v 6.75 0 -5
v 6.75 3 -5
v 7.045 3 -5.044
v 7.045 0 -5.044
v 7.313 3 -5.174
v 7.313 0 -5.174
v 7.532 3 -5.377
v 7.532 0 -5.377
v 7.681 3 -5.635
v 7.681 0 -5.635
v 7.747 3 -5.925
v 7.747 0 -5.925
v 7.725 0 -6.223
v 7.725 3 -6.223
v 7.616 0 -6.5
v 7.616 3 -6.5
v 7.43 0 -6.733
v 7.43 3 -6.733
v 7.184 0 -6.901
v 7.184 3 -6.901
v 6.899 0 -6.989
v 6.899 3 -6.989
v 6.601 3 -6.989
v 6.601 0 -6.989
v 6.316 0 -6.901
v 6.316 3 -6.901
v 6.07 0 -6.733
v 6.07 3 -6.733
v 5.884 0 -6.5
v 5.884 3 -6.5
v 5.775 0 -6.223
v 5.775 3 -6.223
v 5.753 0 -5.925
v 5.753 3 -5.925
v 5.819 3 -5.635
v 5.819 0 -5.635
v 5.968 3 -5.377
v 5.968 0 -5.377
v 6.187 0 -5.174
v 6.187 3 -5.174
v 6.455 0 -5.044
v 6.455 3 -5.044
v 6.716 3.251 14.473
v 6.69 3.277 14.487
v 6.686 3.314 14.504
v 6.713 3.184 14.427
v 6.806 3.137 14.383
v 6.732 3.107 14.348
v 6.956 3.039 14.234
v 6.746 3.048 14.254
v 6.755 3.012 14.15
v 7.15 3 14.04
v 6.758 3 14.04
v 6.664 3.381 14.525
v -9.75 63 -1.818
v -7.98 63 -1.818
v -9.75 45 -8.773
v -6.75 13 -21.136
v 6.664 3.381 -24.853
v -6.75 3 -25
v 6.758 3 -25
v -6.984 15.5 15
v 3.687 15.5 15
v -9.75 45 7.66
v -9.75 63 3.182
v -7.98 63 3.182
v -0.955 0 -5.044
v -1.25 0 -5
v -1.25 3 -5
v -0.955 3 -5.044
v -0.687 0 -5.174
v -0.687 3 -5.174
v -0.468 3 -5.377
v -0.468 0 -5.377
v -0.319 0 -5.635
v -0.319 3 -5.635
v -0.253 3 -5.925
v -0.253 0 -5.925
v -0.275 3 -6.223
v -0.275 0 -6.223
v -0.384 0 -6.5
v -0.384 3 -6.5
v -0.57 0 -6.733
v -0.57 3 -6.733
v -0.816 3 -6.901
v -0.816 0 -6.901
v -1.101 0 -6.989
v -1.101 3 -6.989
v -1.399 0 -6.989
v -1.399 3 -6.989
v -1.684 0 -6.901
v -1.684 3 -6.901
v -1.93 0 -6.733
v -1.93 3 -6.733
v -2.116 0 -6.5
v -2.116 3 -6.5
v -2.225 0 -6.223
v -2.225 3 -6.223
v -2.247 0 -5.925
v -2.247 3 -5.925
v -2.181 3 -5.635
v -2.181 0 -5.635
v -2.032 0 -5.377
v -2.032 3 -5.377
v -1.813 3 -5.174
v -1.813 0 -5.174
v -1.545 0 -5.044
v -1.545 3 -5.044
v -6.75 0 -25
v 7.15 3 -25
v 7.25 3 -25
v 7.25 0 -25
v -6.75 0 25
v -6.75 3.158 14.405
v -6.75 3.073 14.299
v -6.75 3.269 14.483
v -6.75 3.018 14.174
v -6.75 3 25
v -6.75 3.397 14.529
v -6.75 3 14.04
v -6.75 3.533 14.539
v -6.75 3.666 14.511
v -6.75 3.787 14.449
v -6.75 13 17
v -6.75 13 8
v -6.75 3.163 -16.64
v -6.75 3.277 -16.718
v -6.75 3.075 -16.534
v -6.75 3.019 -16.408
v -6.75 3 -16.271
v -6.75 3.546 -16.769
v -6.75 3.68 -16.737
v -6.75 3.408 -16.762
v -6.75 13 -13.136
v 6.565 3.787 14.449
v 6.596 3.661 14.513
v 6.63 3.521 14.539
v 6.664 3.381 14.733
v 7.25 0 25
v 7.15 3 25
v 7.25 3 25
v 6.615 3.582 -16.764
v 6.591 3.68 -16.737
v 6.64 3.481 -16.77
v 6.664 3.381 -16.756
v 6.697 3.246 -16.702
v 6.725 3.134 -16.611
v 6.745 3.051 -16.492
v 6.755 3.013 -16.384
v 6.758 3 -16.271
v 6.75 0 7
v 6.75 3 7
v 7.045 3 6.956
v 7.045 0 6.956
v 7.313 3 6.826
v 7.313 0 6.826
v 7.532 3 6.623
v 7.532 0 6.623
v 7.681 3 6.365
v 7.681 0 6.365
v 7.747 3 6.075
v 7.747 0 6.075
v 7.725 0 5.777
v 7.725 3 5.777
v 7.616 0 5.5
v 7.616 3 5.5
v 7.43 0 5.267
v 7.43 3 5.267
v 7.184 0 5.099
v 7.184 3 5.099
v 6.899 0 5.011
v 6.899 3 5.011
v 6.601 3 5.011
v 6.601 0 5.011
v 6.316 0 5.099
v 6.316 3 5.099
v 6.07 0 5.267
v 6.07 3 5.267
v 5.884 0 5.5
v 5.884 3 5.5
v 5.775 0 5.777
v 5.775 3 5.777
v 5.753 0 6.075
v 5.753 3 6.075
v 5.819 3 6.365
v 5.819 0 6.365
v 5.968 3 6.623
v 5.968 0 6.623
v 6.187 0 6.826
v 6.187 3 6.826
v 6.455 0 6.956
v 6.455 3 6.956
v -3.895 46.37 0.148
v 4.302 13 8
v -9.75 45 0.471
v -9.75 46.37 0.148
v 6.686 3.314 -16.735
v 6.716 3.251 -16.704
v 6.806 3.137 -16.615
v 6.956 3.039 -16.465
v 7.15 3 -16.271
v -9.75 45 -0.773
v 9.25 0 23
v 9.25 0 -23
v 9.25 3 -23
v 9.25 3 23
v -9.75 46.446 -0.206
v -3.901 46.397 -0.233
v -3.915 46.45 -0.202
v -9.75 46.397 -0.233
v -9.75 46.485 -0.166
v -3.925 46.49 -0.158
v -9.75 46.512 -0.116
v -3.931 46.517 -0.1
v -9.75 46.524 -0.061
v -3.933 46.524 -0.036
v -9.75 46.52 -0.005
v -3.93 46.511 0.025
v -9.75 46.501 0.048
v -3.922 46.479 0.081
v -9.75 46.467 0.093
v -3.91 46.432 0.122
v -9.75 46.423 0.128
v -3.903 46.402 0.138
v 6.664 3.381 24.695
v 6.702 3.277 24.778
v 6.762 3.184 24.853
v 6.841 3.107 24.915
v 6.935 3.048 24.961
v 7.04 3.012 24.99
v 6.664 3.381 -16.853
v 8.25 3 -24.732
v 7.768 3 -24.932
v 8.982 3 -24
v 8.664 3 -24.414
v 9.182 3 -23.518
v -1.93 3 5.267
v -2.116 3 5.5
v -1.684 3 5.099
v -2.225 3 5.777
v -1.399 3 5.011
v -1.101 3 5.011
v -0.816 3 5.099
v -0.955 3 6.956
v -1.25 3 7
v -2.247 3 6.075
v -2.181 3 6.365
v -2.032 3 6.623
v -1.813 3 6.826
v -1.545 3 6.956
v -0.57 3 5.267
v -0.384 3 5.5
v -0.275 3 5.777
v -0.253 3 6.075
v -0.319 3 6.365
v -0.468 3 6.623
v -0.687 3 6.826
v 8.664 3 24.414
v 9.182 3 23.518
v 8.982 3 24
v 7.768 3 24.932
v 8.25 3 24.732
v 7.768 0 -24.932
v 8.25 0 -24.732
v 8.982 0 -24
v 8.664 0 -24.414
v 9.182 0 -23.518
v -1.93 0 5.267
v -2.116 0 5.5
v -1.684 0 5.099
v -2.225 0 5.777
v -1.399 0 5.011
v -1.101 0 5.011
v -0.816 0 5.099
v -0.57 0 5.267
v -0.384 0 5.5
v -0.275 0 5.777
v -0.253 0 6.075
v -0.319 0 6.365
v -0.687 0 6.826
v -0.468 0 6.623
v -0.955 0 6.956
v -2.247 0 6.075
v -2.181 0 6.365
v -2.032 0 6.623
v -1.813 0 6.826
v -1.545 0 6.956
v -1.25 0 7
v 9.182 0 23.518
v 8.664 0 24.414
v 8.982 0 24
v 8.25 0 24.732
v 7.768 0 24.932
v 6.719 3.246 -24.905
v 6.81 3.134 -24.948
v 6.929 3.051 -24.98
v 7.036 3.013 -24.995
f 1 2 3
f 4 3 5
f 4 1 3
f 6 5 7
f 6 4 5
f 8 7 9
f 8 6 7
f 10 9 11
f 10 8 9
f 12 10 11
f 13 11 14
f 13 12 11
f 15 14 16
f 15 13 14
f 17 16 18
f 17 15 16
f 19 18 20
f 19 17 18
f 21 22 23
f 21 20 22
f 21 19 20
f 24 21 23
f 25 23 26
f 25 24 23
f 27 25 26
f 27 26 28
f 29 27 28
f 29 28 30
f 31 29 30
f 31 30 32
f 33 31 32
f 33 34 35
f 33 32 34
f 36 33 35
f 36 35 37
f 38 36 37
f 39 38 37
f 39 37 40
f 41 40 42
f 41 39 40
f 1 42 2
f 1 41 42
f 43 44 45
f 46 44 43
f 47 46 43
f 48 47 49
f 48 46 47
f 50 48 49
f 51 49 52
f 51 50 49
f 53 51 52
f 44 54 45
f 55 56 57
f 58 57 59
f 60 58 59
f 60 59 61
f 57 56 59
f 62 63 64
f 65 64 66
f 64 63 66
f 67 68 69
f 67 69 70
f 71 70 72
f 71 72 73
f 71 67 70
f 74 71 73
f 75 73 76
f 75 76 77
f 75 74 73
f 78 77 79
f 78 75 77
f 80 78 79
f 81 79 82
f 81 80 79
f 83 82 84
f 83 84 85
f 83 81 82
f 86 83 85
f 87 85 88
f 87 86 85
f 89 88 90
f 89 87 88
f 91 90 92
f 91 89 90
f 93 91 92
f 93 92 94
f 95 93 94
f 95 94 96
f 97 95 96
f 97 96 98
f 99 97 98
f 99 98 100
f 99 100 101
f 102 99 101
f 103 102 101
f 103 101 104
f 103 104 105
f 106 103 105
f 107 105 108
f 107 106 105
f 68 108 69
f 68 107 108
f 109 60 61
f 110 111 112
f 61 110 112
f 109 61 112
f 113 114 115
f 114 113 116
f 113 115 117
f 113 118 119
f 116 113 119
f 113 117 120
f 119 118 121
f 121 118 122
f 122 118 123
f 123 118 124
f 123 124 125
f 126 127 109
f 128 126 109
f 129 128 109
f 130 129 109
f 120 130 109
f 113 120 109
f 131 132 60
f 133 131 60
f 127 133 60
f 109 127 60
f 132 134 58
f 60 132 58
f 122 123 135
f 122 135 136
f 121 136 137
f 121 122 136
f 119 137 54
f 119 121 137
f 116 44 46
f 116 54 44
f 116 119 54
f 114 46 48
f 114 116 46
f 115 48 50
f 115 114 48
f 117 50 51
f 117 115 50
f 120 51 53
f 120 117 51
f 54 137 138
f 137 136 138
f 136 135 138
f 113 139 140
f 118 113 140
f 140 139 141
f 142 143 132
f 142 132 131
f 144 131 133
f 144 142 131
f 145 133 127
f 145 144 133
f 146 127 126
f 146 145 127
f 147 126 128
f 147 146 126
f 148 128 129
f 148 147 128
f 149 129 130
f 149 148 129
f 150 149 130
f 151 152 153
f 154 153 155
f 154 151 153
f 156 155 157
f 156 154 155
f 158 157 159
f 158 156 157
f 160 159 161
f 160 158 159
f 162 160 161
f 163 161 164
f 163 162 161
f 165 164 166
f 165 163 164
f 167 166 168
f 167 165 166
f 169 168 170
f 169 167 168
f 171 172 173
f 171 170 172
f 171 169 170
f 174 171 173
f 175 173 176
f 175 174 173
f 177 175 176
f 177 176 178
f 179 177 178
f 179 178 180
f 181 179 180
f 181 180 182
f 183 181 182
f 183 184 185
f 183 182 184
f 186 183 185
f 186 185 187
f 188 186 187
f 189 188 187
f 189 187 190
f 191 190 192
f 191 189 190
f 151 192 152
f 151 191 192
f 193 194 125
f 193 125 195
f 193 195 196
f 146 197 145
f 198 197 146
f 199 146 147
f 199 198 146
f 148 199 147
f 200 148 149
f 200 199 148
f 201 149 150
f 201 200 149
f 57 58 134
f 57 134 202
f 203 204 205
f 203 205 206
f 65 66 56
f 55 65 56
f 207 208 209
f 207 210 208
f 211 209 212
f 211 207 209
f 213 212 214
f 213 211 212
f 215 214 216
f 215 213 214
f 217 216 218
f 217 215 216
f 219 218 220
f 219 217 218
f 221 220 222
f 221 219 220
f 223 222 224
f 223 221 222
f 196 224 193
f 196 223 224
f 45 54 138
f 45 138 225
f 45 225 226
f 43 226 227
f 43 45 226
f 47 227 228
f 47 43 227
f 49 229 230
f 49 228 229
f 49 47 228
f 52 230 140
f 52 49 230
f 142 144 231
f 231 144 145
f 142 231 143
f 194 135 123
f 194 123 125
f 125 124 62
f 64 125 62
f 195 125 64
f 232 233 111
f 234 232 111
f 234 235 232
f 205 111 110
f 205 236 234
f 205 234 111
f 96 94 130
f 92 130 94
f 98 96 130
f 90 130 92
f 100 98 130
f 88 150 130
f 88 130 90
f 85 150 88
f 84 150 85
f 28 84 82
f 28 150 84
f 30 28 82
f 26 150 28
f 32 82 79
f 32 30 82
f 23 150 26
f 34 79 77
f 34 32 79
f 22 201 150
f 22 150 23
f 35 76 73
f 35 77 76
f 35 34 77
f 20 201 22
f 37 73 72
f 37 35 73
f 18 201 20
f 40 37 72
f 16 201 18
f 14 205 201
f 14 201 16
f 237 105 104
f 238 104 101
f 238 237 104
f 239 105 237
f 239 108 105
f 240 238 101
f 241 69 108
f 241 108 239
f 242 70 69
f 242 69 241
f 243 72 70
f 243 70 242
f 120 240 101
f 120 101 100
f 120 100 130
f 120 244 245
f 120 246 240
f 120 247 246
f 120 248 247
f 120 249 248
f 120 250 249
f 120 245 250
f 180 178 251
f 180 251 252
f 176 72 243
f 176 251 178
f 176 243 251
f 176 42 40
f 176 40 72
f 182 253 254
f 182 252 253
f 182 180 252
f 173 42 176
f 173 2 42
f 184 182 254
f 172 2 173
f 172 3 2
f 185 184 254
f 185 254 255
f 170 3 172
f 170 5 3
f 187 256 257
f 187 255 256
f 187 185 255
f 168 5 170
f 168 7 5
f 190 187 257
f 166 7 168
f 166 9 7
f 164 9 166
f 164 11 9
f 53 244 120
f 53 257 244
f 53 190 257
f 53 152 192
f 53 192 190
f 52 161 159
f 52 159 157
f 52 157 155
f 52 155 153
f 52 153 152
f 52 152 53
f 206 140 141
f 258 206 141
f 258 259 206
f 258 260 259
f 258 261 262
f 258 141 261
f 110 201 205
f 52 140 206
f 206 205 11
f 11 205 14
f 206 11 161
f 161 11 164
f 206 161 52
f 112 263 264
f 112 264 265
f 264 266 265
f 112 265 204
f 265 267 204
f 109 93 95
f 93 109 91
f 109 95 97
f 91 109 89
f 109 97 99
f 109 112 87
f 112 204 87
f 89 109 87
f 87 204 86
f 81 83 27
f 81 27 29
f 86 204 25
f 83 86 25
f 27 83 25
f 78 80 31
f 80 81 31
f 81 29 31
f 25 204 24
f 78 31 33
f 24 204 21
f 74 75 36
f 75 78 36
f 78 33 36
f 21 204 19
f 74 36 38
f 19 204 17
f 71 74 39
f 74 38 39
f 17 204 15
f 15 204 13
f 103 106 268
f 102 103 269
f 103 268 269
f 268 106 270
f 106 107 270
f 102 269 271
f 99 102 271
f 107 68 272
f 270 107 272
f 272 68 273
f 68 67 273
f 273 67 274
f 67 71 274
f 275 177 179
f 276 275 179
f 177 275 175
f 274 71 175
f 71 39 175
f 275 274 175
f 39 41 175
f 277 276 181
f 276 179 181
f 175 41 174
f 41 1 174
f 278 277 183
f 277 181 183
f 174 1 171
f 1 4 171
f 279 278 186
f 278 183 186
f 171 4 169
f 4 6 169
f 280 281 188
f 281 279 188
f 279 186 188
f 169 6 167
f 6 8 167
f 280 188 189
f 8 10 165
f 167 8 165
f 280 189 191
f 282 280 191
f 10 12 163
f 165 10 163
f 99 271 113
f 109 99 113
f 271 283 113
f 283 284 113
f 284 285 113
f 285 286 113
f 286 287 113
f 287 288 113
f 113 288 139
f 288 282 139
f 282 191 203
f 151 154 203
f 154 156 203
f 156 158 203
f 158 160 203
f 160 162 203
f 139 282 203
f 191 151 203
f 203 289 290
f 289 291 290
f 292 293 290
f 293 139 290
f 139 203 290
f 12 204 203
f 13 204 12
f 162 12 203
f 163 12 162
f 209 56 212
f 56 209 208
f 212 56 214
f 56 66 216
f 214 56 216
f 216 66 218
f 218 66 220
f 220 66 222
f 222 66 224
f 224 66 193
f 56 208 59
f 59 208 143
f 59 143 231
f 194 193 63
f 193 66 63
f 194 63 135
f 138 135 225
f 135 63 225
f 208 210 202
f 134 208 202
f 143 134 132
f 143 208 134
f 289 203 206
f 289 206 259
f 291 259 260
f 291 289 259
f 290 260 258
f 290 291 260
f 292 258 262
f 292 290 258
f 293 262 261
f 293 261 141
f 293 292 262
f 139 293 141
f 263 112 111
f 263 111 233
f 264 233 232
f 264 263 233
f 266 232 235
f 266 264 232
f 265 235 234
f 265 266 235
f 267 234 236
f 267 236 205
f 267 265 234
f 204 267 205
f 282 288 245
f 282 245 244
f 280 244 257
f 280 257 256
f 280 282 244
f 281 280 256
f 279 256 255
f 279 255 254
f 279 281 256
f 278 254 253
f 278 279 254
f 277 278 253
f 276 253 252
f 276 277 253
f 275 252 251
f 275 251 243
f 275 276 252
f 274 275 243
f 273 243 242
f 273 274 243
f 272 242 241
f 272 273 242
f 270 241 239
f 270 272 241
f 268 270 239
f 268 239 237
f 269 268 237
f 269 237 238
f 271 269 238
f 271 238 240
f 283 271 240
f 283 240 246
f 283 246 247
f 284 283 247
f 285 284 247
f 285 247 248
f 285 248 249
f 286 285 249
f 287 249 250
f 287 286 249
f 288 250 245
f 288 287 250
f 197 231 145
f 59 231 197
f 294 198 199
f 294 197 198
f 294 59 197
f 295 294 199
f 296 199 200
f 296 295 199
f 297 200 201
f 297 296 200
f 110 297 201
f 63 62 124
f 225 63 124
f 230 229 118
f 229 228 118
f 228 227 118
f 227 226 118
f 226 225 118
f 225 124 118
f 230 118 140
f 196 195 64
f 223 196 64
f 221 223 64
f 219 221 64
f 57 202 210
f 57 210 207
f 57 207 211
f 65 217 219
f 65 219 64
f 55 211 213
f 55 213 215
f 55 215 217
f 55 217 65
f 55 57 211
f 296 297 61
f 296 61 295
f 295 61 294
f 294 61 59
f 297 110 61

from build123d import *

# Parameters (mm, degrees)
SKETCH_1_R          = 1
EXTRUDE_1_DEPTH     = 3
SKETCH_2_W          = 16.007753667
SKETCH_2_H          = 50
EXTRUDE_2_DEPTH     = 80
CUT_EXTRUDE_1_DEPTH = 89.149011211
CUT_EXTRUDE_2_DEPTH = 81.960252593
EXTRUDE_3_DEPTH     = 3
CUT_EXTRUDE_3_DEPTH = 82.357621032
FILLET_1_R          = 0.5
FILLET_2_R          = 0.2


with BuildPart() as part:
    # 草图1 → 凸台-拉伸1 (new body)
    with BuildSketch(Plane(origin=(0, 0, 0), x_dir=(1, 0, 0), z_dir=(0, 1, 0))):
        with BuildLine():
            Line((-9.25, 25), (7.25, 25))
            ThreePointArc((7.25, 25), (8.664213562, 24.414213562), (9.25, 23))
            Line((9.25, 23), (9.25, -23))
            ThreePointArc((9.25, -23), (8.664213562, -24.414213562), (7.25, -25))
            Line((7.25, -25), (-9.25, -25))
            Line((-9.25, -25), (-9.25, 25))
        make_face()
        with Locations(Location((-1.25, 6, 0), (0, 0, 270))):
            Circle(SKETCH_1_R, mode=Mode.SUBTRACT)
        with Locations(Location((-1.25, -6, 0), (0, 0, 270))):
            Circle(SKETCH_1_R, mode=Mode.SUBTRACT)
        with Locations(Location((6.75, -6, 0), (0, 0, 270))):
            Circle(SKETCH_1_R, mode=Mode.SUBTRACT)
        with Locations(Location((6.75, 6, 0), (0, 0, 270))):
            Circle(SKETCH_1_R, mode=Mode.SUBTRACT)
    extrude(amount=EXTRUDE_1_DEPTH)

    # 草图2 → 凸台-拉伸2 (add)
    with BuildSketch(Plane(origin=(0, 3, 0), x_dir=(1, 0, 0), z_dir=(0, 1, 0))):
        with Locations((-1.246123166, 0)):
            Rectangle(SKETCH_2_W, SKETCH_2_H)
    extrude(amount=EXTRUDE_2_DEPTH)

    # 草图3 → 切除-拉伸1 (cut, through all)
    with BuildSketch(Plane(origin=(6.757753667, 0, 0), x_dir=(0, 0, -1), z_dir=(1, 0, 0))):
        Polygon((-25, 3), (-15, 15.5), (-3.181818182, 63), (1.818181818, 63), (25, 3), (32.784332669, 3), (32.784332669, 88.133626677), (-39.086773644, 88.133626677), (-39.086773644, 3), align=None)
        Polygon((-15, 3), (-8, 13), (0, 47), (17, 3), align=None)
    extrude(amount=-CUT_EXTRUDE_1_DEPTH, mode=Mode.SUBTRACT)

    # 草图4 → 切除-拉伸2 (cut, through all)
    with BuildSketch(Plane.XY.offset(25)):
        Polygon((6.757753667, 3), (6.757753667, 67.763295657), (-9.14963747, 67.763295657), align=None)
    extrude(amount=-CUT_EXTRUDE_2_DEPTH, mode=Mode.SUBTRACT)

    # 草图5 → 凸台-拉伸3 (add)
    with BuildSketch(Plane.ZY.offset(9.25)):
        Polygon((-1.818181818, 63), (-25, 3), (-25, 0), (25, 0), (25, 3), (15, 15.5), (3.181818182, 63), align=None)
        Polygon((0, 47), (-17, 3), (15, 3), (8, 13), align=None, mode=Mode.SUBTRACT)
    extrude(amount=EXTRUDE_3_DEPTH)

    # 草图6 → 切除-拉伸3 (cut, through all)
    with BuildSketch(Plane(origin=(0, 0, -25), x_dir=(-1, 0, 0), z_dir=(0, 0, -1))):
        Polygon((6.75, 0), (6.75, 13), (9.75, 45), (9.75, 64.870972757), (14.09361996, 64.870972757), (14.09361996, 0), align=None)
    extrude(amount=-CUT_EXTRUDE_3_DEPTH, mode=Mode.SUBTRACT)

    # 圆角1
    # the kernel refuses this fillet: 0.5 mm, written as the material it adds along each edge
    with BuildSketch(Plane(origin=(-6.75, 3, 15), x_dir=(0, 0, -1), z_dir=(1, 0, 0))) as fillet_1_piece_1_section:
        with BuildLine():
            CenterArc((FILLET_1_R * 1.92065556157, FILLET_1_R), FILLET_1_R, 145.007979801, 124.992020199)
            Line((FILLET_1_R * 1.10142364105, FILLET_1_R * 1.57346234436), (0, 0))
            Line((0, 0), (FILLET_1_R * 1.92065556157, 0))
        make_face()
    fillet_1_piece_1 = extrude(amount=15.908573119, mode=Mode.PRIVATE)
    fillet_1_piece_1 = split(fillet_1_piece_1, bisect_by=Plane(origin=(6.326718063, 4.754862629, 14.622728055), z_dir=(-0.9711342799096353, -0.23853345757858466, 0)), keep=Keep.TOP, mode=Mode.PRIVATE)
    add(fillet_1_piece_1)
    with BuildSketch(Plane(origin=(8.58076235, 3, -17), x_dir=(0, 0, 1), z_dir=(-1, 0, 0))) as fillet_1_piece_2_section:
        with BuildLine():
            CenterArc((FILLET_1_R * 1.45840694682, FILLET_1_R), FILLET_1_R, 158.875280854, 111.124719146)
            Line((FILLET_1_R * 0.525608812419, FILLET_1_R * 1.3603992792), (0, 0))
            Line((0, 0), (FILLET_1_R * 1.45840694682, 0))
        make_face()
    fillet_1_piece_2 = extrude(amount=15.33076235, mode=Mode.PRIVATE)
    fillet_1_piece_2 = split(fillet_1_piece_2, bisect_by=Plane(origin=(6.334852861, 4.721743663, -16.763347765), z_dir=(-0.9711342799096353, -0.23853345757858466, 0)), keep=Keep.TOP, mode=Mode.PRIVATE)
    add(fillet_1_piece_2)
    with BuildSketch(Plane(origin=(6.757753667, 3, 14.019874802), x_dir=(1, 0, 0), z_dir=(0, 0, 1))) as fillet_1_piece_3_section:
        with BuildLine():
            CenterArc((FILLET_1_R * 0.784100158108, FILLET_1_R), FILLET_1_R, 193.8, 76.2)
            Line((-FILLET_1_R * 0.187034121801, FILLET_1_R * 0.761466542421), (0, 0))
            Line((0, 0), (FILLET_1_R * 0.784100158108, 0))
        make_face()
    fillet_1_piece_3 = extrude(amount=10.980125198, mode=Mode.PRIVATE)
    fillet_1_piece_3 = split(fillet_1_piece_3, bisect_by=Plane(origin=(6.823819727, 0.737200979, 16.583959315), z_dir=(0, 0.5734623443633292, 0.8192319205190398)), keep=Keep.TOP, mode=Mode.PRIVATE)
    fillet_1_piece_3 = split(fillet_1_piece_3, bisect_by=Plane(origin=(6.823819727, 5.521194882, 22.983044095), z_dir=(0, -0.6246950475544246, -0.7808688094430302)), keep=Keep.TOP, mode=Mode.PRIVATE)
    add(fillet_1_piece_3)
    with BuildSketch(Plane(origin=(6.757753667, 3, -25), x_dir=(1, 0, 0), z_dir=(0, 0, 1))) as fillet_1_piece_4_section:
        with BuildLine():
            CenterArc((FILLET_1_R * 0.784100158108, FILLET_1_R), FILLET_1_R, 193.8, 76.2)
            Line((-FILLET_1_R * 0.187034121801, FILLET_1_R * 0.761466542421), (0, 0))
            Line((0, 0), (FILLET_1_R * 0.784100158108, 0))
        make_face()
    fillet_1_piece_4 = extrude(amount=8.980125198, mode=Mode.PRIVATE)
    fillet_1_piece_4 = split(fillet_1_piece_4, bisect_by=Plane(origin=(6.823760744, 4.428941995, -24.447908775), z_dir=(0, -0.36039927920216236, 0.9327981344055969)), keep=Keep.TOP, mode=Mode.PRIVATE)
    fillet_1_piece_4 = split(fillet_1_piece_4, bisect_by=Plane(origin=(6.823760744, 1.739503793, -17.487009898), z_dir=(0, 0.3603992792021622, -0.9327981344055969)), keep=Keep.TOP, mode=Mode.PRIVATE)
    add(fillet_1_piece_4)
    with BuildSketch(Plane(origin=(-6.75, 3, 15), x_dir=(0, 0, -1), z_dir=(1, 0, 0))) as fillet_1_piece_5a_section:
        with BuildLine():
            CenterArc((FILLET_1_R * 1.92065556157, FILLET_1_R), FILLET_1_R, 145.007979801, 124.992020199)
            Line((FILLET_1_R * 1.10142364105, FILLET_1_R * 1.57346234436), (0, 0))
            Line((0, 0), (FILLET_1_R * 1.92065556157, 0))
        make_face()
    fillet_1_piece_5a = extrude(amount=15.908573119, mode=Mode.PRIVATE)
    fillet_1_piece_5a = split(fillet_1_piece_5a, bisect_by=Plane(origin=(6.778509417, 2.915497721, 14.622764636), z_dir=(0.9711342799096353, 0.23853345757858466, 0)), keep=Keep.TOP, mode=Mode.PRIVATE)
    with BuildSketch(Plane(origin=(6.757753667, 3, 14.019874802), x_dir=(1, 0, 0), z_dir=(0, 0, 1))) as fillet_1_piece_5b_section:
        with BuildLine():
            CenterArc((FILLET_1_R * 0.784100158108, FILLET_1_R), FILLET_1_R, 193.8, 76.2)
            Line((-FILLET_1_R * 0.187034121801, FILLET_1_R * 0.761466542421), (0, 0))
            Line((0, 0), (FILLET_1_R * 0.784100158108, 0))
        make_face()
    fillet_1_piece_5b = extrude(amount=10.980125198, mode=Mode.PRIVATE)
    fillet_1_piece_5b = split(fillet_1_piece_5b, bisect_by=Plane(origin=(6.828403151, 3.296038352, 14.792773154), z_dir=(0, -0.5734623443633292, -0.8192319205190398)), keep=Keep.TOP, mode=Mode.PRIVATE)
    fillet_1_piece_5 = fillet_1_piece_5a & fillet_1_piece_5b
    add(fillet_1_piece_5)
    with BuildSketch(Plane(origin=(6.757753667, 3, -25), x_dir=(1, 0, 0), z_dir=(0, 0, 1))) as fillet_1_piece_6a_section:
        with BuildLine():
            CenterArc((FILLET_1_R * 0.784100158108, FILLET_1_R), FILLET_1_R, 193.8, 76.2)
            Line((-FILLET_1_R * 0.187034121801, FILLET_1_R * 0.761466542421), (0, 0))
            Line((0, 0), (FILLET_1_R * 0.784100158108, 0))
        make_face()
    fillet_1_piece_6a = extrude(amount=8.980125198, mode=Mode.PRIVATE)
    fillet_1_piece_6a = split(fillet_1_piece_6a, bisect_by=Plane(origin=(6.826253209, 3.240744299, -16.906985157), z_dir=(0, -0.3603992792021622, 0.9327981344055969)), keep=Keep.TOP, mode=Mode.PRIVATE)
    with BuildSketch(Plane(origin=(8.58076235, 3, -17), x_dir=(0, 0, 1), z_dir=(-1, 0, 0))) as fillet_1_piece_6b_section:
        with BuildLine():
            CenterArc((FILLET_1_R * 1.45840694682, FILLET_1_R), FILLET_1_R, 158.875280854, 111.124719146)
            Line((FILLET_1_R * 0.525608812419, FILLET_1_R * 1.3603992792), (0, 0))
            Line((0, 0), (FILLET_1_R * 1.45840694682, 0))
        make_face()
    fillet_1_piece_6b = extrude(amount=15.33076235, mode=Mode.PRIVATE)
    fillet_1_piece_6b = split(fillet_1_piece_6b, bisect_by=Plane(origin=(6.770254608, 2.949105284, -16.764105763), z_dir=(0.9711342799096353, 0.23853345757858466, 0)), keep=Keep.TOP, mode=Mode.PRIVATE)
    fillet_1_piece_6 = fillet_1_piece_6a & fillet_1_piece_6b
    add(fillet_1_piece_6)

    # 圆角2
    fillet_2_edges = [part.edges().sort_by_distance(p)[0] for p in [
        (-6.899841453, 47, 0),
    ]]
    fillet(fillet_2_edges, radius=FILLET_2_R)


solid = part.part
